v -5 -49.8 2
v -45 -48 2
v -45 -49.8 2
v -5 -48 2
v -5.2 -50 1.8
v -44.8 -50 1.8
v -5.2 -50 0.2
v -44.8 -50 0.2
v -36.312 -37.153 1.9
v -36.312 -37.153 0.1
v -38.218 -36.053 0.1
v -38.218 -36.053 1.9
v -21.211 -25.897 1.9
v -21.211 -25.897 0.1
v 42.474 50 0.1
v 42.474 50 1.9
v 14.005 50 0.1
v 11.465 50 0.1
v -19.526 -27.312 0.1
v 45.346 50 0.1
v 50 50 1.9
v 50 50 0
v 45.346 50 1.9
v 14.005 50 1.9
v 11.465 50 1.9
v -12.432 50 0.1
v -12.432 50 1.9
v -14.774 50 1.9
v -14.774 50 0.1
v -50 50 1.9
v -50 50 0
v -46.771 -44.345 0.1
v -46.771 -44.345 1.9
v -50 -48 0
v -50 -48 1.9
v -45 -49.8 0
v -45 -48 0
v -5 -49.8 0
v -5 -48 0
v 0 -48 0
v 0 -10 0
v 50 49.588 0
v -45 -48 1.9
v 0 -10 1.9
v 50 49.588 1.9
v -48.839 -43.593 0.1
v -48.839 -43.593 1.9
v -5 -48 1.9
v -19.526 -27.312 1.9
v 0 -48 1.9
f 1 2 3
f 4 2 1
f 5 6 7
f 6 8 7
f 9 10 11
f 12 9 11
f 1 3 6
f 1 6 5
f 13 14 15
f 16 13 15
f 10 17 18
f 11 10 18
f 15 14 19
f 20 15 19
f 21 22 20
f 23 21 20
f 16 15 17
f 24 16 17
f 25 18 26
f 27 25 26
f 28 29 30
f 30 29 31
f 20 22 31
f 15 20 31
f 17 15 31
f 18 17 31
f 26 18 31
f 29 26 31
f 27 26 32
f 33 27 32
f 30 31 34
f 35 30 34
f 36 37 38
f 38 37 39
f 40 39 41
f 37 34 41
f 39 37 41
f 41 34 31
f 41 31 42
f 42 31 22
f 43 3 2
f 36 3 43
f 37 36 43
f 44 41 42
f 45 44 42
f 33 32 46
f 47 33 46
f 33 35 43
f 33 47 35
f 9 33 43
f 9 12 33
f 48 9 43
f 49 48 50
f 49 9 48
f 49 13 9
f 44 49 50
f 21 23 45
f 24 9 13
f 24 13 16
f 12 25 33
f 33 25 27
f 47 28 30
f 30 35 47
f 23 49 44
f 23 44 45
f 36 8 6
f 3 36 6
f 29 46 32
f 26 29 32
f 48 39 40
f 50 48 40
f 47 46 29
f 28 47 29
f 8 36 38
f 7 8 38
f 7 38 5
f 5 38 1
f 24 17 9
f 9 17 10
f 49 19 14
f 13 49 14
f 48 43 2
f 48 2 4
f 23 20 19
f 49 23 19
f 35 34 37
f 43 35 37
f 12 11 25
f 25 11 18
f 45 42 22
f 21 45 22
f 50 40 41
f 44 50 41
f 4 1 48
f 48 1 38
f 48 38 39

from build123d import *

# Parameters (mm, degrees)
BOSS_EXTRUDE1_DEPTH = 1.9
BOSS_EXTRUDE5_DEPTH = 0.1
SKETCH6_W           = 40
SKETCH6_H           = 2
BOSS_EXTRUDE6_DEPTH = 0.1
CHAMFER2_SIZE       = 0.2


with BuildPart() as part:
    # Sketch1 → Boss-Extrude1 (new body)
    with BuildSketch(Plane.XY):
        Polygon((-36.312345137, -37.152540378), (-38.217601025, -36.052540378), (11.464856327, 50), (-12.432381024, 50), (-46.771329023, -44.345484236), (-48.838652789, -43.593039921), (-14.773572123, 50), (-50, 50), (-50, -48), (-45, -48), (-45, -50), (-5, -50), (-5, -48), (0, -48), (0, -10), (50, 49.58767963), (50, 50), (45.345911136, 50), (-19.526148963, -27.311510683), (-21.211446738, -25.897377941), (42.474015099, 50), (14.005197511, 50), align=None)
    extrude(amount=BOSS_EXTRUDE1_DEPTH)

    # Sketch2 → Boss-Extrude5 (add)
    with BuildSketch(Plane(origin=(0, 0, 0), x_dir=(-1, 0, 0), z_dir=(0, 0, -1))):
        Polygon((-45.345911136, 50), (-42.474015099, 50), (21.211446738, -25.897377941), (19.526148963, -27.311510683), align=None)
        Polygon((-14.005197511, 50), (36.312345137, -37.152540378), (38.217601025, -36.052540378), (-11.464856327, 50), align=None)
        Polygon((12.432381024, 50), (14.773572123, 50), (48.838652789, -43.593039921), (46.771329023, -44.345484236), align=None)
    extrude(amount=-BOSS_EXTRUDE5_DEPTH)

    # Sketch6 → Boss-Extrude6 (add)
    with BuildSketch(Plane.XY.offset(1.9)):
        with Locations((-25, -49)):
            Rectangle(SKETCH6_W, SKETCH6_H)
    extrude(amount=BOSS_EXTRUDE6_DEPTH)

    # Chamfer2
    chamfer2_edges = [part.edges().sort_by_distance(p)[0] for p in [
        (-25, -50, 2),
        (-25, -50, 0),
        (-5, -50, 1),
        (-45, -50, 1),
    ]]
    chamfer(chamfer2_edges, length=CHAMFER2_SIZE)


solid = part.part
